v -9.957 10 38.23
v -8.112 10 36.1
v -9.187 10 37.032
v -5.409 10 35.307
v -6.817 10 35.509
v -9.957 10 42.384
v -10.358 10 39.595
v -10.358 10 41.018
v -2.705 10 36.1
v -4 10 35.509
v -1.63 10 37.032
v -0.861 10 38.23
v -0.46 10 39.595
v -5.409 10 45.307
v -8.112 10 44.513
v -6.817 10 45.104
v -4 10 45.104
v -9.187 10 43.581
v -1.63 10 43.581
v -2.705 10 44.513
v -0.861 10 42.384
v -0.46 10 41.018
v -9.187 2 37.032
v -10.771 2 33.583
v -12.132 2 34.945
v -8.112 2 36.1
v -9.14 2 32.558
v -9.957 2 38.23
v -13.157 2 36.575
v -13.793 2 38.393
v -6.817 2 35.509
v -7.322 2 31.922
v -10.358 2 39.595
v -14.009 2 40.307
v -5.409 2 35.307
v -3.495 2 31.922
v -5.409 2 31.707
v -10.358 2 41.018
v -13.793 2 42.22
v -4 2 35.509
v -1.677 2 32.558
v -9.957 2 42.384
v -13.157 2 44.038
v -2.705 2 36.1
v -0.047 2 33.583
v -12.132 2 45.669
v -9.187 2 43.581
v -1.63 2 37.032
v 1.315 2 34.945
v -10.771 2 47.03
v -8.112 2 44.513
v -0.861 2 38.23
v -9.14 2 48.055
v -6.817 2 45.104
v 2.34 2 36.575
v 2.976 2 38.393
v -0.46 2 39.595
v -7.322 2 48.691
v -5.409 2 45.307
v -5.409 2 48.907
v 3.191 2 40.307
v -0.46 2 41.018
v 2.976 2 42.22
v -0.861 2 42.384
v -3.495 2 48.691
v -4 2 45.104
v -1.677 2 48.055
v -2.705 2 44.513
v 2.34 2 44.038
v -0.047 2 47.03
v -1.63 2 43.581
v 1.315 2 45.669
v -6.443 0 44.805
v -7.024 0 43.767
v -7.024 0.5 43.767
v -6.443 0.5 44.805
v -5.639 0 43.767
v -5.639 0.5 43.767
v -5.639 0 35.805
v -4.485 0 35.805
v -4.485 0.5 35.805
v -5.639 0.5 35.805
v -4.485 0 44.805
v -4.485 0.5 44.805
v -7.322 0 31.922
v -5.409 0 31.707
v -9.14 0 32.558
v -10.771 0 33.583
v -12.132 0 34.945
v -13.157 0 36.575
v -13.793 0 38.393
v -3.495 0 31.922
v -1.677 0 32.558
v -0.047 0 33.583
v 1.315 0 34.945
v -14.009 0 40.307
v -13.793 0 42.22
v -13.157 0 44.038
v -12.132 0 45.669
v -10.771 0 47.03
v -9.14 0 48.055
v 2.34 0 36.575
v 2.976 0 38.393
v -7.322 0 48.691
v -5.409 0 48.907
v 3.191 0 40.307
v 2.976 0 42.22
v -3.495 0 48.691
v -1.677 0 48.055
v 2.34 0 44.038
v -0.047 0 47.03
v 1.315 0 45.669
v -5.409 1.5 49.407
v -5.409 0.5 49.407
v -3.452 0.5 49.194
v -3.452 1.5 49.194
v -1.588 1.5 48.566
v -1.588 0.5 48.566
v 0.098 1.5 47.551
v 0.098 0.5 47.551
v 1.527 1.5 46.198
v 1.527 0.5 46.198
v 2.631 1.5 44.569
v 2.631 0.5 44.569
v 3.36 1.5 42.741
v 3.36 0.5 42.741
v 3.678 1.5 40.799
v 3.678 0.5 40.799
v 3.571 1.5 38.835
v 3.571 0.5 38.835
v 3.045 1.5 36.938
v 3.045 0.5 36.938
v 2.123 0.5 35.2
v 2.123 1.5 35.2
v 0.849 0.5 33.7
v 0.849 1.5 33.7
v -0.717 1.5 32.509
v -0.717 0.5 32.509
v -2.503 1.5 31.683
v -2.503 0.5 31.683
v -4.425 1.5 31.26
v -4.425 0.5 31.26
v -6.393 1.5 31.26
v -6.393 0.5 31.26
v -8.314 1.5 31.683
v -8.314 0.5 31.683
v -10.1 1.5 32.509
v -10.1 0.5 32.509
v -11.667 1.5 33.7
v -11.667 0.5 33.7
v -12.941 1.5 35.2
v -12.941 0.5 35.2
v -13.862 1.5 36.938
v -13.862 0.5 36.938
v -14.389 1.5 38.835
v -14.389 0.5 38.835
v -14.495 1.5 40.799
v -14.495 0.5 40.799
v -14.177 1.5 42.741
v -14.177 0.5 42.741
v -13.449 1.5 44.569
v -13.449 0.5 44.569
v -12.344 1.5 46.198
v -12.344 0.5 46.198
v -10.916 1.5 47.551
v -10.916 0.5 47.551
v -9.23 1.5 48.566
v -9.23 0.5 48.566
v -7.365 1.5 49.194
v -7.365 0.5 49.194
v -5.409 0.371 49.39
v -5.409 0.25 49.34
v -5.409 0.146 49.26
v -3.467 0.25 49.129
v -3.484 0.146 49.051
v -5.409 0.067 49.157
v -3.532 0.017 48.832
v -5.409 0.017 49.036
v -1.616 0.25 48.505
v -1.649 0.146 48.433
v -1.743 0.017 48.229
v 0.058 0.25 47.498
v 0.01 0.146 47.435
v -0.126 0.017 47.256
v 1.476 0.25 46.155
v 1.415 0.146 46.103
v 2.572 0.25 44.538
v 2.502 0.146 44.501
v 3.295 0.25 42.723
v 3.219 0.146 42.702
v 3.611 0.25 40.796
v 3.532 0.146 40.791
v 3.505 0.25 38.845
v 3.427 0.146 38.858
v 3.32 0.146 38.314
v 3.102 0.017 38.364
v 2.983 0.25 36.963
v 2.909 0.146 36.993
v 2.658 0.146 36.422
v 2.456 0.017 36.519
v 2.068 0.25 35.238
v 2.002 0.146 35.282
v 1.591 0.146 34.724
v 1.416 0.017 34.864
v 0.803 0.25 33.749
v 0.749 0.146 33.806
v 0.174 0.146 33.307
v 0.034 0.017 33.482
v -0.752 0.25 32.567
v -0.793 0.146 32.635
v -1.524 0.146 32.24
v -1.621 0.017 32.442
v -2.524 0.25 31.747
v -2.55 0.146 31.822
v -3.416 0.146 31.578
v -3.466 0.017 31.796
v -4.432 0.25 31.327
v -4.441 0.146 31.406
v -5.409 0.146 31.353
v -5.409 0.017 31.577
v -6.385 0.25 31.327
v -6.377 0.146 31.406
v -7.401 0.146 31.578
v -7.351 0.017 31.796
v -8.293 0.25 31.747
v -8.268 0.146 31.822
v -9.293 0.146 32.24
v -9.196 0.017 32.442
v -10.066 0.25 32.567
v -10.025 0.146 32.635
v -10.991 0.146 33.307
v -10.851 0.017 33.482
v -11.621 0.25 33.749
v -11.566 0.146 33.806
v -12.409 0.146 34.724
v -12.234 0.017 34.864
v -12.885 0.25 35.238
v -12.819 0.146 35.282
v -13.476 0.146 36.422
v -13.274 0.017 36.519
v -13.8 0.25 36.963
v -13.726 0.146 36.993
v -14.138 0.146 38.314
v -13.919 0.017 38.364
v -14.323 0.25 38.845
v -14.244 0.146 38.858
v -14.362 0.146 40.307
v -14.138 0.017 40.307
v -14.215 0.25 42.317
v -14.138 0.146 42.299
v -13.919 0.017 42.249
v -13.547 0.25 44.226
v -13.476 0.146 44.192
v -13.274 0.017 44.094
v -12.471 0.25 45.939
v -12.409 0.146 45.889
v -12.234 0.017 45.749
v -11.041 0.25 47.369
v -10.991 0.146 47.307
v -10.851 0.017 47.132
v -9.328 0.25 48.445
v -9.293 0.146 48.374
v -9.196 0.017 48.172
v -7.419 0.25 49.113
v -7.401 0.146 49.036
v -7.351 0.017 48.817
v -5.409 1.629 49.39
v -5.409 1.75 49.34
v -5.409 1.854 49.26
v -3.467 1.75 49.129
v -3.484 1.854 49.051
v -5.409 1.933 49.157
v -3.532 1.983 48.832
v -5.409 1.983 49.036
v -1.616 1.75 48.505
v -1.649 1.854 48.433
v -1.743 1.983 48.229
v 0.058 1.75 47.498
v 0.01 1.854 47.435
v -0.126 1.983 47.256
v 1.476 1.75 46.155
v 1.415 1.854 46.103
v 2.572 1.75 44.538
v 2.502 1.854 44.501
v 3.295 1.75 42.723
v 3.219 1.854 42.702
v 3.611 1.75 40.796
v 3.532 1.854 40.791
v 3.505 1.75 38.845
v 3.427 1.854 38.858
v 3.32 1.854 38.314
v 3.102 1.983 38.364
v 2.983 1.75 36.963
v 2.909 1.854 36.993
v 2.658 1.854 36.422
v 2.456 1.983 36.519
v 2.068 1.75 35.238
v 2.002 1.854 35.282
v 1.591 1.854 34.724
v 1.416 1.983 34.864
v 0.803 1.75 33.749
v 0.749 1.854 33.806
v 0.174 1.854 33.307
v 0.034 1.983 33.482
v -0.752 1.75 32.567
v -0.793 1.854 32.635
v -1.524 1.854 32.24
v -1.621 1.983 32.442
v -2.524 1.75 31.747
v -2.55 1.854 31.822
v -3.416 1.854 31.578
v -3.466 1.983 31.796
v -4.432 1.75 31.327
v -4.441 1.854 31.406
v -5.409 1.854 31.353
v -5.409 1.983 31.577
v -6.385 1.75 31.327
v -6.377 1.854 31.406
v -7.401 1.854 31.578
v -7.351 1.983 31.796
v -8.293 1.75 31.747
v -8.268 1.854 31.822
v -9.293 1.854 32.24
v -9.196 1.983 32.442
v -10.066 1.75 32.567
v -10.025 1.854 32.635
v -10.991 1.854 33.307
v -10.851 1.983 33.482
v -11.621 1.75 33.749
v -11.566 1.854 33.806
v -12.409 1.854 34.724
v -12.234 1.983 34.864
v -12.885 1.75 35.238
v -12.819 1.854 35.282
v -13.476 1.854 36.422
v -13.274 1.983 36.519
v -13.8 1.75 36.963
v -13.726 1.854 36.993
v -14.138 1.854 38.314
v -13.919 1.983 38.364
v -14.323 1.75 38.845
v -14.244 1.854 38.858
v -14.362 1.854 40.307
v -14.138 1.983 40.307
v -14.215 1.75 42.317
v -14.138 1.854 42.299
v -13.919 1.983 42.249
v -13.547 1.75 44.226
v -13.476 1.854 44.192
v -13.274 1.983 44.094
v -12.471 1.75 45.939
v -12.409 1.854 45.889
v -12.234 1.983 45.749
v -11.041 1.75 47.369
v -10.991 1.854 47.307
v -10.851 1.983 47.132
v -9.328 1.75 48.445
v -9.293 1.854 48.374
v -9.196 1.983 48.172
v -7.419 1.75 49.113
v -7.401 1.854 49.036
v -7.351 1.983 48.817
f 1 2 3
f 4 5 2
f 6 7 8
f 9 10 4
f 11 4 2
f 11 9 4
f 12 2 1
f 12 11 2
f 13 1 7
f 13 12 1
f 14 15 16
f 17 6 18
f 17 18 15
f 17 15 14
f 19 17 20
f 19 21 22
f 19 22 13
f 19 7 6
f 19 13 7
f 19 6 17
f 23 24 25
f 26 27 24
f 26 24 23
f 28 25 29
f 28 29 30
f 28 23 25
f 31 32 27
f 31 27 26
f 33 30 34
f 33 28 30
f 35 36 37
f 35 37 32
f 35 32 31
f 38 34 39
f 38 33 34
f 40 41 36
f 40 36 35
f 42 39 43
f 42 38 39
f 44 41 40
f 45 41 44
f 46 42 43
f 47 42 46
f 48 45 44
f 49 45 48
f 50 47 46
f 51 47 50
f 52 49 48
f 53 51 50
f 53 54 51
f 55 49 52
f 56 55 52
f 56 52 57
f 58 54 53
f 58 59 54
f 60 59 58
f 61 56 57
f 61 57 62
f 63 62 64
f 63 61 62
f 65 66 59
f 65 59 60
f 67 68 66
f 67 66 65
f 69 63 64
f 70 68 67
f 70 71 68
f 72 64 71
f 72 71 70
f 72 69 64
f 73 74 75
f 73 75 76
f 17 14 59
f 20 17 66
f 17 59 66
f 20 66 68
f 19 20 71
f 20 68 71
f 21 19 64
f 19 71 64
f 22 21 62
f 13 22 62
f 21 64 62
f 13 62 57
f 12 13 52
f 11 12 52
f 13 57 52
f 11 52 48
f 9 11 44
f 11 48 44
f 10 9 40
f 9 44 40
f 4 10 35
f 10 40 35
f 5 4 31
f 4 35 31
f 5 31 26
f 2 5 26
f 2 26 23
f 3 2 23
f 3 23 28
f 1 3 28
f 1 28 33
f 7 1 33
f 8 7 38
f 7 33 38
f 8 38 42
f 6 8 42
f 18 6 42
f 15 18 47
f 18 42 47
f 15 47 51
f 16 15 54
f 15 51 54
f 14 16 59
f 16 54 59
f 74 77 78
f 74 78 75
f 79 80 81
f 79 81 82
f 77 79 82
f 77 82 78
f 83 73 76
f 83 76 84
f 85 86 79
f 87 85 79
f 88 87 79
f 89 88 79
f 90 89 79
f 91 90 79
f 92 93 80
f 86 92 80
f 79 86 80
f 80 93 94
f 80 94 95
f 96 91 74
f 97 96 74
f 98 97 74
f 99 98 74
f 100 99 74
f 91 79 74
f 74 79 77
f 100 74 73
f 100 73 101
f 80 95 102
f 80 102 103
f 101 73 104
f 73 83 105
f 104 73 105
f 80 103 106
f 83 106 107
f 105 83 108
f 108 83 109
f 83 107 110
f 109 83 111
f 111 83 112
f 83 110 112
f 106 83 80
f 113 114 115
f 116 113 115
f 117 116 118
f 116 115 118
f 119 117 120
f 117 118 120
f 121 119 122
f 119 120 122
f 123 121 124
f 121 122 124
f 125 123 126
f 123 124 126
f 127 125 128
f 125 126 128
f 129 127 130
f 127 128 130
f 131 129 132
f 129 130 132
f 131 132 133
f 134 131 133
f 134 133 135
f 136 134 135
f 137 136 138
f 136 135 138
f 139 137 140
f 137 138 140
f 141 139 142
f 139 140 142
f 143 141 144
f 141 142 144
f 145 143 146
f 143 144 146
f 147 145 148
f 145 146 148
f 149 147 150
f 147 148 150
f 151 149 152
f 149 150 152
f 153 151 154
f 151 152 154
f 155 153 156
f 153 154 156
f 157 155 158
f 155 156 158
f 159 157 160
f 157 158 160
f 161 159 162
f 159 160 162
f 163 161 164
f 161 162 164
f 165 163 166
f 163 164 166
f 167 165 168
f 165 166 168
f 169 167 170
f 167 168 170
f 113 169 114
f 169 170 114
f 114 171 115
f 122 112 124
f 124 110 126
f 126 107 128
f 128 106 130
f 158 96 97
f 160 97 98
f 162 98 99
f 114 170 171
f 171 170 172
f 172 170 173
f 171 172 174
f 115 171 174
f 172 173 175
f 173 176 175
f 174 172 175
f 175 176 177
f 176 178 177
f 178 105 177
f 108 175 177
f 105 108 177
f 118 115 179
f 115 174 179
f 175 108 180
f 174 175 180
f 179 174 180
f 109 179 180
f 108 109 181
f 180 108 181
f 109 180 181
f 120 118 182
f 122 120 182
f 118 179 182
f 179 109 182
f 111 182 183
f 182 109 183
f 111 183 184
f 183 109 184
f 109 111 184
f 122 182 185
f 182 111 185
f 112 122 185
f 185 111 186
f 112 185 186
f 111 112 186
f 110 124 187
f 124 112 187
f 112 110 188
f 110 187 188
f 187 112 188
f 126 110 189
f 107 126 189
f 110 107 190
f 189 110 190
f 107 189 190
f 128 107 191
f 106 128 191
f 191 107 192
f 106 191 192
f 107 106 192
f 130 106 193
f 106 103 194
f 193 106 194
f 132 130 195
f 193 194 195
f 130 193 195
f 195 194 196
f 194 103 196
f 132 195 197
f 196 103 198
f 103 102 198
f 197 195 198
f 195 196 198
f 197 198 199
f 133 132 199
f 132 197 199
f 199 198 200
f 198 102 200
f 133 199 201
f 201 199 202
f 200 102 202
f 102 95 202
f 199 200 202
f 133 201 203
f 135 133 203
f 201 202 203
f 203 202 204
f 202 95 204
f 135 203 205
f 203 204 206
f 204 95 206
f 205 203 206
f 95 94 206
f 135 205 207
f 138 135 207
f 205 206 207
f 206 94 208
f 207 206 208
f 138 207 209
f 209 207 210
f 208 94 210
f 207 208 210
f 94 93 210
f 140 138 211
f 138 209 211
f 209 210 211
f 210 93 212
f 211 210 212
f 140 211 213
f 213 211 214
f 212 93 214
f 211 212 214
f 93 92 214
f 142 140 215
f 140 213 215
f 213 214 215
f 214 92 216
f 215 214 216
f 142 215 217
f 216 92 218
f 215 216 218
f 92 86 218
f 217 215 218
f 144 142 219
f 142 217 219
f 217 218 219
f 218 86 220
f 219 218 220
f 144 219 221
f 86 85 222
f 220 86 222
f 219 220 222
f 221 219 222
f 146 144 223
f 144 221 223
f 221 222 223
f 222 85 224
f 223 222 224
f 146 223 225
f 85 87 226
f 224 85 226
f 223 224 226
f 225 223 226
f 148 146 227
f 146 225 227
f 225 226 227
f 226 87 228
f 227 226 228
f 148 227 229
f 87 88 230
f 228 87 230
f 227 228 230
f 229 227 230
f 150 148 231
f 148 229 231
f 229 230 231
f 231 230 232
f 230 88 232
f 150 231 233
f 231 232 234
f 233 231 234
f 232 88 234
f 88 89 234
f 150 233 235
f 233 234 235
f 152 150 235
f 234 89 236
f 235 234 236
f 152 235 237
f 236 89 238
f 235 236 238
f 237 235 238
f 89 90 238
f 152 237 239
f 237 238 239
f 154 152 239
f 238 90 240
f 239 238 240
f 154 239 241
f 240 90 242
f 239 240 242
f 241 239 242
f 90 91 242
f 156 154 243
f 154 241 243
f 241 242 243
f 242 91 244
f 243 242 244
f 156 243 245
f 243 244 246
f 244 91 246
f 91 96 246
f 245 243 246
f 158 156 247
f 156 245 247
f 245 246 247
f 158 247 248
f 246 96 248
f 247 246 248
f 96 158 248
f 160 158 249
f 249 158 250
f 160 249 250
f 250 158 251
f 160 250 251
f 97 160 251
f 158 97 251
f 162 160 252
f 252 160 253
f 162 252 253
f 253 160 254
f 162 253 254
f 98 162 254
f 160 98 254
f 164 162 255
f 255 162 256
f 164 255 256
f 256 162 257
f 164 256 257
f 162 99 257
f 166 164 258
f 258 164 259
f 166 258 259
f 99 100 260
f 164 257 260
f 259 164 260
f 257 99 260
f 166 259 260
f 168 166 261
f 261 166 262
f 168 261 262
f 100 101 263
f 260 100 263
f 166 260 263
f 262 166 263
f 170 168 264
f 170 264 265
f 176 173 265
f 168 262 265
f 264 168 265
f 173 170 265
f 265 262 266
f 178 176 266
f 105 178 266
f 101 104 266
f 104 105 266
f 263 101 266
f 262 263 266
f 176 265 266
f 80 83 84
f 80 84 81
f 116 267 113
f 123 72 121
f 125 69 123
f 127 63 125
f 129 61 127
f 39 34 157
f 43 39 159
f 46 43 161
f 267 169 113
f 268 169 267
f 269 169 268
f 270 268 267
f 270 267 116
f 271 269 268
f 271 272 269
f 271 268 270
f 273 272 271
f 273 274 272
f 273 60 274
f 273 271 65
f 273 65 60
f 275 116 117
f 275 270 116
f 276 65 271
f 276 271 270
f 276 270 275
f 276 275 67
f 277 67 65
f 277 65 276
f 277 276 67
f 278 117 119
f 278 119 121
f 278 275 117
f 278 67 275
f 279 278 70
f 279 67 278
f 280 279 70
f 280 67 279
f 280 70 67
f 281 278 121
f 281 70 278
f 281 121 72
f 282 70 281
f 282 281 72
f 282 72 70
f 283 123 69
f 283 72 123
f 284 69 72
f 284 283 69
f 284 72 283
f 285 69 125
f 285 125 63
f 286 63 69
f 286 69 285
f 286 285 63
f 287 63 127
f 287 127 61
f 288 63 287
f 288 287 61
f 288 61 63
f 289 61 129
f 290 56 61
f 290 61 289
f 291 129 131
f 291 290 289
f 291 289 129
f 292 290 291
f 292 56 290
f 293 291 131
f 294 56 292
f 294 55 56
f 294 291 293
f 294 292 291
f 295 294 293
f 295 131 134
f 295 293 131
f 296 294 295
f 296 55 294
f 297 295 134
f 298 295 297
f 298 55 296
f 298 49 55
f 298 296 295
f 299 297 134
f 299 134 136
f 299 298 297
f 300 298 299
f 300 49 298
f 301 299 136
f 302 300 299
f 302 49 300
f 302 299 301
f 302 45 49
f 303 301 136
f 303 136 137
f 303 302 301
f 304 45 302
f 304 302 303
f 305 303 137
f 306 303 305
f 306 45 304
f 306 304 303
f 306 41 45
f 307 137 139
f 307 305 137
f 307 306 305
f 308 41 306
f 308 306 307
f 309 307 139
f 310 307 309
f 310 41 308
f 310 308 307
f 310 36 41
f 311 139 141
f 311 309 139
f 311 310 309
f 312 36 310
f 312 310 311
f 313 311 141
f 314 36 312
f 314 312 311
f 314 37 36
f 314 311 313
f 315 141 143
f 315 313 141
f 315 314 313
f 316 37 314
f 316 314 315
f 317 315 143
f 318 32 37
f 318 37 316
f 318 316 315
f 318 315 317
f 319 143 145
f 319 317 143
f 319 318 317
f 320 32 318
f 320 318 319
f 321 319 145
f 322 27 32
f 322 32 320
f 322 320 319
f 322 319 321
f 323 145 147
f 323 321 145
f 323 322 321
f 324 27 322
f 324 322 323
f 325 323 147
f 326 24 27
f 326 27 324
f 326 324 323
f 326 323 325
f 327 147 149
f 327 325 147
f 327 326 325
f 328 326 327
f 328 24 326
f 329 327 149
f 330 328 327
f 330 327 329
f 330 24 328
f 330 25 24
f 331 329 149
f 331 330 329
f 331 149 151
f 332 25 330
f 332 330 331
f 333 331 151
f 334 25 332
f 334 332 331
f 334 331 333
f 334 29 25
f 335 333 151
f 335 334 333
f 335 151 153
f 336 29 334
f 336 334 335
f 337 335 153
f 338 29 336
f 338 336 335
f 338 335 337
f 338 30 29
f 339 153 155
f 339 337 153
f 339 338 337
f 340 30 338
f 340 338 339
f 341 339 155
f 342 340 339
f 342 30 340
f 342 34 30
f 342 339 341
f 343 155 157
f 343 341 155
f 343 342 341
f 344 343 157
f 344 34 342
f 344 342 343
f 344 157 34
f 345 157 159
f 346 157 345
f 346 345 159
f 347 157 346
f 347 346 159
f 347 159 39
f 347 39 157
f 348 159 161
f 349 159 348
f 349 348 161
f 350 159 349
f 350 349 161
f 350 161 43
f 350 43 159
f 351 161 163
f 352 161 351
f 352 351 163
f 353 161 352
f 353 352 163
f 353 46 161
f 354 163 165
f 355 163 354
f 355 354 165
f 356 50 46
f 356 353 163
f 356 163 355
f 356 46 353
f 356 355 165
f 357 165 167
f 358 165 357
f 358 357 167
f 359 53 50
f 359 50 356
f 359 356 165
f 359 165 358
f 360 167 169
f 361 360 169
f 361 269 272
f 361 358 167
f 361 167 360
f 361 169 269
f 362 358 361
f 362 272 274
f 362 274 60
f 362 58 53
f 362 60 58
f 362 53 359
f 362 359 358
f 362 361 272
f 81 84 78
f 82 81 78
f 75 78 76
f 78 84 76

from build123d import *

# Parameters (mm, degrees)
SKETCH1_R           = 9.1
BOSS_EXTRUDE5_DEPTH = 2
SKETCH4_R           = 5
BOSS_EXTRUDE6_DEPTH = 8
CUT_EXTRUDE2_DEPTH  = 0.5
FILLET1_R           = 0.5


with BuildPart() as part:
    # Sketch1 → Boss-Extrude5 (new body)
    with BuildSketch(Plane(origin=(0, 0, 0), x_dir=(1, 0, 0), z_dir=(0, 1, 0))):
        with Locations(Location((-5.408676197, -40.3067379, 0), (0, 0, 270))):
            Circle(SKETCH1_R)
    extrude(amount=BOSS_EXTRUDE5_DEPTH)

    # Sketch4 → Boss-Extrude6 (add)
    with BuildSketch(Plane(origin=(0, 2, 0), x_dir=(1, 0, 0), z_dir=(0, 1, 0))):
        with Locations(Location((-5.408676197, -40.3067379, 0), (0, 0, 270))):
            Circle(SKETCH4_R)
    extrude(amount=BOSS_EXTRUDE6_DEPTH)

    # Sketch5 → Cut-Extrude2 (cut)
    with BuildSketch(Plane.XZ):
        Polygon((-6.443159021, 44.805369713), (-4.485226328, 44.805369713), (-4.485226328, 35.805369713), (-5.639072482, 35.805369713), (-5.639072482, 43.766908174), (-7.023687867, 43.766908174), align=None)
    extrude(amount=-CUT_EXTRUDE2_DEPTH, mode=Mode.SUBTRACT)

    # Fillet1
    fillet1_edges = [part.edges().sort_by_distance(p)[0] for p in [
        (-5.408676197, 0, 31.2067379),
        (-5.408676197, 2, 31.2067379),
    ]]
    fillet(fillet1_edges, radius=FILLET1_R)


solid = part.part
